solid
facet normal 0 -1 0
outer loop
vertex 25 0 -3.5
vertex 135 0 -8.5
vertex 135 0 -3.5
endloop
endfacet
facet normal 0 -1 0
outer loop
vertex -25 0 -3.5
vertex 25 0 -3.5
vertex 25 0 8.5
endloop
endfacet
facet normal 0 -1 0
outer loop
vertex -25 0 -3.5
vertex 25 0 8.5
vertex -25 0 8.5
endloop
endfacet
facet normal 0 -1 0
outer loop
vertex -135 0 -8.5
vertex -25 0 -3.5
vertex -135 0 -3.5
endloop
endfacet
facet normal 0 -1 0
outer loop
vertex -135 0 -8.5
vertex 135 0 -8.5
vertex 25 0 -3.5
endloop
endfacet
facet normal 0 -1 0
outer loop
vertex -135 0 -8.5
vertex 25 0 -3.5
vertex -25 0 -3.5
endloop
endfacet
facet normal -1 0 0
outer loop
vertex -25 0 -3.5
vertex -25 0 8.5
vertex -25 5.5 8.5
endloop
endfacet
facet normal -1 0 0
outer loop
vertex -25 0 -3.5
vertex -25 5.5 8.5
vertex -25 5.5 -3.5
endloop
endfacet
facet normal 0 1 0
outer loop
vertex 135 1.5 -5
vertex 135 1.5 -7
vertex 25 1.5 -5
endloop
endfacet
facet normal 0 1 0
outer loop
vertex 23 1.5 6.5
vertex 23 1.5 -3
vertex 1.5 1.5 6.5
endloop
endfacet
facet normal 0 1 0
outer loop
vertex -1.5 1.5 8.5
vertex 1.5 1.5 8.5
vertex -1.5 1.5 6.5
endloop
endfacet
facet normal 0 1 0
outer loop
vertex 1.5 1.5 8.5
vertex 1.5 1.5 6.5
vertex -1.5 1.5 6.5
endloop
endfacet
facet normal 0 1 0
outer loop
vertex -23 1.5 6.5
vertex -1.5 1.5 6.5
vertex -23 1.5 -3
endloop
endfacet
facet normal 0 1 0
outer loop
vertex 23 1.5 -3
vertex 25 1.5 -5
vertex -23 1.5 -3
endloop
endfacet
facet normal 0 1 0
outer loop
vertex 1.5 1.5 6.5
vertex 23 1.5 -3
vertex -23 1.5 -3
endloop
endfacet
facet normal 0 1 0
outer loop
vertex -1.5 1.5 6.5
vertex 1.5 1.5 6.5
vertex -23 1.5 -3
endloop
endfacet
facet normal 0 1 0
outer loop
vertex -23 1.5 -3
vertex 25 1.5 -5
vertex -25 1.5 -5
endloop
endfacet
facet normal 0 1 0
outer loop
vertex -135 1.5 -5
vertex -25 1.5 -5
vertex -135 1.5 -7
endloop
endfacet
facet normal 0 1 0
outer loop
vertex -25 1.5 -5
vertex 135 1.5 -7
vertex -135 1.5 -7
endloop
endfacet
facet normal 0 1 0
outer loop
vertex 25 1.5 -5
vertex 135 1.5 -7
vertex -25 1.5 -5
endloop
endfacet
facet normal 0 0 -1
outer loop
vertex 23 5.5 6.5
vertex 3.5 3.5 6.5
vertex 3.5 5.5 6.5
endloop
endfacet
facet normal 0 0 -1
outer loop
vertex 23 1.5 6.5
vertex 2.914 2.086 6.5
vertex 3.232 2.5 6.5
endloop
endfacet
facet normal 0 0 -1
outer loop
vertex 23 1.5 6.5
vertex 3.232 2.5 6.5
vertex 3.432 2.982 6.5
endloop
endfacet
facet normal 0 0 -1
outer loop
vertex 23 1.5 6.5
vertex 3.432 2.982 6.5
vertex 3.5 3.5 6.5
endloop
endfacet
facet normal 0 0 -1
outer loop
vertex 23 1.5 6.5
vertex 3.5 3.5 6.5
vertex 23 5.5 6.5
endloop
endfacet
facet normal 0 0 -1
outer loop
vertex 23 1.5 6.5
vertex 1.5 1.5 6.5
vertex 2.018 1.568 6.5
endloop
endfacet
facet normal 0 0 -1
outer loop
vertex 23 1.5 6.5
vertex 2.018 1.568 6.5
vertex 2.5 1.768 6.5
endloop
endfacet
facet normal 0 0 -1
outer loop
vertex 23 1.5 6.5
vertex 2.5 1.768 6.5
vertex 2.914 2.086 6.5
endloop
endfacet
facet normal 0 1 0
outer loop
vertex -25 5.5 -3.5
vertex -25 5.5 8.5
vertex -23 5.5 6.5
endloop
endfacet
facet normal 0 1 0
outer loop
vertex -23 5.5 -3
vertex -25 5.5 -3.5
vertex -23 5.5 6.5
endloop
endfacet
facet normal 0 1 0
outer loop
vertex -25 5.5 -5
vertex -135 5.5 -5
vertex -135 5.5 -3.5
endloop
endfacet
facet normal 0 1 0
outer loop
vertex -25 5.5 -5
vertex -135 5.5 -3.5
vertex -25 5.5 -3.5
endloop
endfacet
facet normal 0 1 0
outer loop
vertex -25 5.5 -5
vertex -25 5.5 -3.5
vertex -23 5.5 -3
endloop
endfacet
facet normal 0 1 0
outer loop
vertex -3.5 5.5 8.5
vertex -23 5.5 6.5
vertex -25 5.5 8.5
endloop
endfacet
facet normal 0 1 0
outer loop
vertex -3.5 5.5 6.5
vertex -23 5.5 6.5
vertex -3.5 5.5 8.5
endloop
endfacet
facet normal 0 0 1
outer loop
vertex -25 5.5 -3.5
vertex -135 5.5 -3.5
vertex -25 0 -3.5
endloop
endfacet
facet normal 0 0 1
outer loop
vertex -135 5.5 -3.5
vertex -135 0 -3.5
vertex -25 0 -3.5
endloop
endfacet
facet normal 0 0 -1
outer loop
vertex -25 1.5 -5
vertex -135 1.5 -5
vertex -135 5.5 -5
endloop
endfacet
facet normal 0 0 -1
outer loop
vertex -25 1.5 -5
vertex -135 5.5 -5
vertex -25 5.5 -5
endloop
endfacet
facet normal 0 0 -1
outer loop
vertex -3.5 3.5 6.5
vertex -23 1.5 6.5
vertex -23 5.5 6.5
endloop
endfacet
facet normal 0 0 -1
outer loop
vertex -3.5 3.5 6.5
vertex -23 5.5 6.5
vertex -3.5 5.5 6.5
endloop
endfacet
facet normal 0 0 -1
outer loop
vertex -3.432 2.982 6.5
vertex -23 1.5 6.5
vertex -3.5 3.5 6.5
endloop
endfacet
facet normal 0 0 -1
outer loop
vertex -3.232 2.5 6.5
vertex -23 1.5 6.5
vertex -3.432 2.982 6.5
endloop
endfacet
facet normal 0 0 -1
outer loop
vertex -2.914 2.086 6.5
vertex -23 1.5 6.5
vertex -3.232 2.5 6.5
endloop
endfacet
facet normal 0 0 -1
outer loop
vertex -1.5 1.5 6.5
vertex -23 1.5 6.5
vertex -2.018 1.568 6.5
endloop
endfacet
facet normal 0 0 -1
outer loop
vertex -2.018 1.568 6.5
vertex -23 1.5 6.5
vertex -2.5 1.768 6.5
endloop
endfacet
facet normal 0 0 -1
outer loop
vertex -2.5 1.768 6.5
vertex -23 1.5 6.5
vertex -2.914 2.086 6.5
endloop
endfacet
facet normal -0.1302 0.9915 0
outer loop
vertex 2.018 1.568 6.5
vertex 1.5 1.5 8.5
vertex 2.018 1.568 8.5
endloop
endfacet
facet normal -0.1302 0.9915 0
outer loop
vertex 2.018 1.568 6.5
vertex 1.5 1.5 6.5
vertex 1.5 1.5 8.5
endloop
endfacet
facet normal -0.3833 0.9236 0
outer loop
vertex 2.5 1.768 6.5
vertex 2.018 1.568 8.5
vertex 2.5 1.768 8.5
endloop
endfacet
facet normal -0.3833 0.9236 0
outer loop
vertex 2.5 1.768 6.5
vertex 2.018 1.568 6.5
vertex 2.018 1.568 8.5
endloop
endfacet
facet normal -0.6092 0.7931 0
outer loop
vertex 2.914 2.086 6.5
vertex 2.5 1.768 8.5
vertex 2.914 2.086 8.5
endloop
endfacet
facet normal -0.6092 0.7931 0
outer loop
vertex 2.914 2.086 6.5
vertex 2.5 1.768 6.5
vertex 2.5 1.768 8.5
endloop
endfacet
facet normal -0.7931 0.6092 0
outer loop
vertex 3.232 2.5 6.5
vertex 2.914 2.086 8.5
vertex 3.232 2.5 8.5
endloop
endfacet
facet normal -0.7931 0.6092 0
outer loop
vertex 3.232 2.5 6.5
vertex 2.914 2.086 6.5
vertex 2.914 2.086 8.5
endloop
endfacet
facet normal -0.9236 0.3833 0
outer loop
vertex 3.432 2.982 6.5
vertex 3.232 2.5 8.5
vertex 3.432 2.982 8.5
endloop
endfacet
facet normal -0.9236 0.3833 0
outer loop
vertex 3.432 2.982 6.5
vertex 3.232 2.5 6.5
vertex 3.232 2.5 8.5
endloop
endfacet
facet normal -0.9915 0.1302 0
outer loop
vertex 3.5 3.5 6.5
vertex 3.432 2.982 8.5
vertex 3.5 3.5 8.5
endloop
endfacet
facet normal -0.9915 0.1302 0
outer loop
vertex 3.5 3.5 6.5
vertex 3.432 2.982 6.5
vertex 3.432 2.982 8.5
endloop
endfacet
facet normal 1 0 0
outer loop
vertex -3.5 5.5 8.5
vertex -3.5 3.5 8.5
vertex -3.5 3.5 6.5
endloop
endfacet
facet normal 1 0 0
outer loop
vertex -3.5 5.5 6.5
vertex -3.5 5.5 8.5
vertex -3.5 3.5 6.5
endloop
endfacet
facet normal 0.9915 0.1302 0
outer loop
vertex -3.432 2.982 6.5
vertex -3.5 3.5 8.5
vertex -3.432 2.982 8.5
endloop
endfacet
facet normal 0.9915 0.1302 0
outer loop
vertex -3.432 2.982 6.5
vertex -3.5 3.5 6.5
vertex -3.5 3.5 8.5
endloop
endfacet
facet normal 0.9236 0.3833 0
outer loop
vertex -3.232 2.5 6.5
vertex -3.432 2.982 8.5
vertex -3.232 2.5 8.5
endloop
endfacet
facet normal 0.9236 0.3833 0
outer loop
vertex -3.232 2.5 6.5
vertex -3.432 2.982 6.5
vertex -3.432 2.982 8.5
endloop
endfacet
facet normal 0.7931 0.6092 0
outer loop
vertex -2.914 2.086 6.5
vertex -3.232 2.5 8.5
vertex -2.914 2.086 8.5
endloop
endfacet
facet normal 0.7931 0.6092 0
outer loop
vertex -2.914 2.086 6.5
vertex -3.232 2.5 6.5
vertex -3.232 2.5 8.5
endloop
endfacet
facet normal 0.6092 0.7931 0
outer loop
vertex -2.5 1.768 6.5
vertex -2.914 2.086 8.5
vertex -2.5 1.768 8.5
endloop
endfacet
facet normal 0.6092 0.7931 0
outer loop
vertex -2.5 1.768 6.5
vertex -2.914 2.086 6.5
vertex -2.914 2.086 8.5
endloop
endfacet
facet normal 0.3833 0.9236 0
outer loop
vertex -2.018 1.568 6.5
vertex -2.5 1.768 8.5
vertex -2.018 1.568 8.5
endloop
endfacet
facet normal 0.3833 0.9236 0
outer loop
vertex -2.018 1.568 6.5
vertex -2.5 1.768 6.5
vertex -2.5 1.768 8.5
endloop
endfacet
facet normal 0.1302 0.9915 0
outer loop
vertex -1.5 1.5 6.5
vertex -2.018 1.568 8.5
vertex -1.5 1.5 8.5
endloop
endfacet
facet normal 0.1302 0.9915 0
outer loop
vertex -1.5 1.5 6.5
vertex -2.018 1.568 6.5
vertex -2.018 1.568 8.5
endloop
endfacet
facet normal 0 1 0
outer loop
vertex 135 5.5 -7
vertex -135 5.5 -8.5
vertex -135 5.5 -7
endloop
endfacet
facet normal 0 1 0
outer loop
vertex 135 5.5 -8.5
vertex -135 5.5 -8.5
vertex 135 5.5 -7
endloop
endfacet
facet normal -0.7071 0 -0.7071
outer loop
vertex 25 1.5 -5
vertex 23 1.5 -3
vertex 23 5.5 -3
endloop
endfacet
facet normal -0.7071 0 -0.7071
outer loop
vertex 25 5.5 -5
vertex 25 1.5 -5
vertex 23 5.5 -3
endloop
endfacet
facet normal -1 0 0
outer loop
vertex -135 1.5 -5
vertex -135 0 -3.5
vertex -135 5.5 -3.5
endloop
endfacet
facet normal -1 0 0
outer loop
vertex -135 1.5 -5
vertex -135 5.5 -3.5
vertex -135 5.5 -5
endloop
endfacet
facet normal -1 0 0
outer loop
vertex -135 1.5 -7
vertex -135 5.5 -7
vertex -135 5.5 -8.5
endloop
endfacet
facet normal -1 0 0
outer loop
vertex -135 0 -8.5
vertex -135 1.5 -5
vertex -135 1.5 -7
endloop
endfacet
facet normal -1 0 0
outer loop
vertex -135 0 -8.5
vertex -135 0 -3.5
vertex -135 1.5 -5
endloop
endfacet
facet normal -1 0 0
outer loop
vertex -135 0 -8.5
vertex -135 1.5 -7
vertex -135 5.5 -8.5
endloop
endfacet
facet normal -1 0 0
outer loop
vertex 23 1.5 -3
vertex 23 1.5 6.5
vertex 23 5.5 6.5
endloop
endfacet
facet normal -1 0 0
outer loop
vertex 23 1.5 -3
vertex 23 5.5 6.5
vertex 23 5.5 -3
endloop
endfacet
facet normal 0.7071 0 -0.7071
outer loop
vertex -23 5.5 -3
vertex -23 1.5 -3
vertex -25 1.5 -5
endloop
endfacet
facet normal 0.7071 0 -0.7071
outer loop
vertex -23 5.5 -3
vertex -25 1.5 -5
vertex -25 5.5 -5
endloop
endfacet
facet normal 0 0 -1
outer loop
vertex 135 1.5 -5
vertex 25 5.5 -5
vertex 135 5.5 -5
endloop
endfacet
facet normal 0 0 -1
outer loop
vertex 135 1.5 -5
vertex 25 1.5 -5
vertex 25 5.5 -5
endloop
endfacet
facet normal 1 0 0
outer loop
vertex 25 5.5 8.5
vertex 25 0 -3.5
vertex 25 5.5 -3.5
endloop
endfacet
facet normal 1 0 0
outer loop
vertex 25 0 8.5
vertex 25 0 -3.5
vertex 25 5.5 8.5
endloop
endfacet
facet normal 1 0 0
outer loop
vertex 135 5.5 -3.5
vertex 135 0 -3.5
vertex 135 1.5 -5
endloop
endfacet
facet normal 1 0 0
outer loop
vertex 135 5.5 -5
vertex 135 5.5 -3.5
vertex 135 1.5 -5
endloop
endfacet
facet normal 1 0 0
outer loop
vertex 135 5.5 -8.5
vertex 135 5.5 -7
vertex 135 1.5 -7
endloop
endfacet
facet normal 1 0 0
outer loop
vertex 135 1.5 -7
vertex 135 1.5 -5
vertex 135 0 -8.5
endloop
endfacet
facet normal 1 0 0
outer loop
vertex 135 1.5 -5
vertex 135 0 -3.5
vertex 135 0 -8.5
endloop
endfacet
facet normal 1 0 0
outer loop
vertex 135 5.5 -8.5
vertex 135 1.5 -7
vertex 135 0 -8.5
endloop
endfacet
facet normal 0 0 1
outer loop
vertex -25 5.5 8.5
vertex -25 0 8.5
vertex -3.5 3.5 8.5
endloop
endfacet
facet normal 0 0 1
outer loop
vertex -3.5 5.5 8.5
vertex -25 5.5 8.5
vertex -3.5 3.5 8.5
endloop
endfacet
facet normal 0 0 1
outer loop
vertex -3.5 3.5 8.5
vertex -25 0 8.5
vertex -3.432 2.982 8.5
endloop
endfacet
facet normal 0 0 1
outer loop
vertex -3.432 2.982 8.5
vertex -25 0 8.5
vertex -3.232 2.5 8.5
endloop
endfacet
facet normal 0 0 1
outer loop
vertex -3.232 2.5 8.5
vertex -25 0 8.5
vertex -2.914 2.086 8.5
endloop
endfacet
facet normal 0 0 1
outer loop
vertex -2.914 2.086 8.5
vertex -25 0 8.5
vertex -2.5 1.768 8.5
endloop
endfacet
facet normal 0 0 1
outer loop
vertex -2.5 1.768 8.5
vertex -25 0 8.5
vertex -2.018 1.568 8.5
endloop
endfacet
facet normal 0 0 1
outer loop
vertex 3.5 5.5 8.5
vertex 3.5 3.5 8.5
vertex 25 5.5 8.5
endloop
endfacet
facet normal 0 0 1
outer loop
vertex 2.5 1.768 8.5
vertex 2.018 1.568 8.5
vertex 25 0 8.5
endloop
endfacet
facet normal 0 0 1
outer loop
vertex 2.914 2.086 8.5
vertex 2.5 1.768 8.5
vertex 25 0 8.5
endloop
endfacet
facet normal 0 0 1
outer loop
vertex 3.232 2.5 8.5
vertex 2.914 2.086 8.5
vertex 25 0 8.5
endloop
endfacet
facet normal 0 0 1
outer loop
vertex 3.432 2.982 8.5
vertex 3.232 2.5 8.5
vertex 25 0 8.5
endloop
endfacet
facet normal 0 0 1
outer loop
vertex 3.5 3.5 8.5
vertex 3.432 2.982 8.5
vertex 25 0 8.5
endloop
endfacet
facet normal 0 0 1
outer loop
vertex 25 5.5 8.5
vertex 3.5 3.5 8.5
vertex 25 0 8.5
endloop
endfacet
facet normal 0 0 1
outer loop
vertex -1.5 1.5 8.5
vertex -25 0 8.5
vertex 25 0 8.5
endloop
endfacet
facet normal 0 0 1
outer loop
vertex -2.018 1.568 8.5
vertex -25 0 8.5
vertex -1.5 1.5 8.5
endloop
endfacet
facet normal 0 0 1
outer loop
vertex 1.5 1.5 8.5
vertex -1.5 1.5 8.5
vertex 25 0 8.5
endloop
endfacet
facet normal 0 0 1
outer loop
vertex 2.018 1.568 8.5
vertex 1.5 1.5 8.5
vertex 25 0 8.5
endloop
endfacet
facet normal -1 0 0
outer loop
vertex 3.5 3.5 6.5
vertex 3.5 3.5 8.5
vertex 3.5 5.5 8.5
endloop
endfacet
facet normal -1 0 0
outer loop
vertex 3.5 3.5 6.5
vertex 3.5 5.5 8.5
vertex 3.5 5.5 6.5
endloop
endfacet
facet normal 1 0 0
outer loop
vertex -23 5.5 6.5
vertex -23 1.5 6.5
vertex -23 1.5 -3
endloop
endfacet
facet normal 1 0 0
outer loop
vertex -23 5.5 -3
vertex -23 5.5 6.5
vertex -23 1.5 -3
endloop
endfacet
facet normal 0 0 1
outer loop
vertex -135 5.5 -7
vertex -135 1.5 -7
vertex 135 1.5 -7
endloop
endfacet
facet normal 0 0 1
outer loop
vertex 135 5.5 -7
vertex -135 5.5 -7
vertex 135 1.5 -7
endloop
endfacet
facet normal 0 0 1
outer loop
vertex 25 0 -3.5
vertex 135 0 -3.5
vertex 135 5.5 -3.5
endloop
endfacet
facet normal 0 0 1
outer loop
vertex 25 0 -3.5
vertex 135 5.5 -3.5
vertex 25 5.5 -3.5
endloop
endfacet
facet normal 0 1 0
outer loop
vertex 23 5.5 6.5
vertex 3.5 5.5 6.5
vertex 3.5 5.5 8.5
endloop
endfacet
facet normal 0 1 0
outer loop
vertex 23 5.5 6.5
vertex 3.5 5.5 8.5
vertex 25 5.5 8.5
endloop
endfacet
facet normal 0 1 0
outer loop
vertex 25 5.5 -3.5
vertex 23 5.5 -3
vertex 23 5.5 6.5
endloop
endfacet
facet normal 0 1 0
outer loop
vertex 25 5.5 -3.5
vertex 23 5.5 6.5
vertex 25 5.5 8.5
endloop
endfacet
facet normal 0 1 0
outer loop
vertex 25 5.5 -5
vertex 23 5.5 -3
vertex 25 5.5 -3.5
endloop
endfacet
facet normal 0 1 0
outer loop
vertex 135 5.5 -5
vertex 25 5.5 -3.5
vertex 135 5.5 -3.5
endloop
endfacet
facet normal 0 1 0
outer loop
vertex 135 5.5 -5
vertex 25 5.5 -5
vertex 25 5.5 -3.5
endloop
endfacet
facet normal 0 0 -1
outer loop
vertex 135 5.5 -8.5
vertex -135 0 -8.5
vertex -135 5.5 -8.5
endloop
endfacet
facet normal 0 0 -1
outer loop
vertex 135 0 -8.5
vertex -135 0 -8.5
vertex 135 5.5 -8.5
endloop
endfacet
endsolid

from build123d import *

# Parameters (mm, degrees)
BOSS_EXTRUDE1_DEPTH = 1.5
SKETCH3_W           = 270
SKETCH3_H           = 1.5
BOSS_EXTRUDE2_DEPTH = 4
SKETCH4_W           = 110
SKETCH4_H           = 1.5
BOSS_EXTRUDE3_DEPTH = 4
SKETCH6_W           = 2
SKETCH6_H           = 13.5
BOSS_EXTRUDE5_DEPTH = 4
SKETCH7_W           = 19.5
SKETCH7_H           = 2
BOSS_EXTRUDE6_DEPTH = 4
CHAMFER1_SIZE       = 2
FILLET1_R           = 2


with BuildPart() as part:
    # Sketch1 → Boss-Extrude1 (new body)
    with BuildSketch(Plane(origin=(0, 0, 0), x_dir=(1, 0, 0), z_dir=(0, 1, 0))):
        Polygon((25, 8.5), (135, 8.5), (135, 3.5), (25, 3.5), (25, -8.5), (-25, -8.5), (-25, 3.5), (-135, 3.5), (-135, 8.5), (-25, 8.5), align=None)
    extrude(amount=BOSS_EXTRUDE1_DEPTH)

    # Sketch3 → Boss-Extrude2 (add)
    with BuildSketch(Plane(origin=(0, 1.5, 0), x_dir=(1, 0, 0), z_dir=(0, 1, 0))):
        with Locations((0, 7.75)):
            Rectangle(SKETCH3_W, SKETCH3_H)
    boss_extrude2 = extrude(amount=BOSS_EXTRUDE2_DEPTH)

    # Sketch4 → Boss-Extrude3 (add)
    with BuildSketch(Plane(origin=(0, 1.5, 0), x_dir=(1, 0, 0), z_dir=(0, 1, 0))):
        with Locations((-80, 4.25)):
            Rectangle(SKETCH4_W, SKETCH4_H)
    boss_extrude3 = extrude(amount=BOSS_EXTRUDE3_DEPTH)

    # Mirror1: Boss-Extrude2, Boss-Extrude3 across plane
    add(boss_extrude2.mirror(Plane(origin=(0, 0, 0), x_dir=(0, 0, 1), z_dir=(1, 0, 0))))
    add(boss_extrude3.mirror(Plane(origin=(0, 0, 0), x_dir=(0, 0, 1), z_dir=(1, 0, 0))))

    # Sketch6 → Boss-Extrude5 (add)
    with BuildSketch(Plane(origin=(0, 1.5, 0), x_dir=(1, 0, 0), z_dir=(0, 1, 0))):
        with Locations((-24, -1.75)):
            Rectangle(SKETCH6_W, SKETCH6_H)
        with Locations((24, -1.75)):
            Rectangle(SKETCH6_W, SKETCH6_H)
    extrude(amount=BOSS_EXTRUDE5_DEPTH)

    # Sketch7 → Boss-Extrude6 (add)
    with BuildSketch(Plane(origin=(0, 1.5, 0), x_dir=(1, 0, 0), z_dir=(0, 1, 0))):
        with Locations((-13.25, -7.5)):
            Rectangle(SKETCH7_W, SKETCH7_H)
        with Locations((13.25, -7.5)):
            Rectangle(SKETCH7_W, SKETCH7_H)
    extrude(amount=BOSS_EXTRUDE6_DEPTH)

    # Chamfer1
    chamfer1_edges = [part.edges().sort_by_distance(p)[0] for p in [
        (-23, 3.5, -5),
        (23, 3.5, -5),
    ]]
    chamfer(chamfer1_edges, length=CHAMFER1_SIZE)

    # Fillet1
    fillet1_edges = [part.edges().sort_by_distance(p)[0] for p in [
        (-3.5, 1.5, 7.5),
        (3.5, 1.5, 7.5),
    ]]
    fillet(fillet1_edges, radius=FILLET1_R)


solid = part.part
